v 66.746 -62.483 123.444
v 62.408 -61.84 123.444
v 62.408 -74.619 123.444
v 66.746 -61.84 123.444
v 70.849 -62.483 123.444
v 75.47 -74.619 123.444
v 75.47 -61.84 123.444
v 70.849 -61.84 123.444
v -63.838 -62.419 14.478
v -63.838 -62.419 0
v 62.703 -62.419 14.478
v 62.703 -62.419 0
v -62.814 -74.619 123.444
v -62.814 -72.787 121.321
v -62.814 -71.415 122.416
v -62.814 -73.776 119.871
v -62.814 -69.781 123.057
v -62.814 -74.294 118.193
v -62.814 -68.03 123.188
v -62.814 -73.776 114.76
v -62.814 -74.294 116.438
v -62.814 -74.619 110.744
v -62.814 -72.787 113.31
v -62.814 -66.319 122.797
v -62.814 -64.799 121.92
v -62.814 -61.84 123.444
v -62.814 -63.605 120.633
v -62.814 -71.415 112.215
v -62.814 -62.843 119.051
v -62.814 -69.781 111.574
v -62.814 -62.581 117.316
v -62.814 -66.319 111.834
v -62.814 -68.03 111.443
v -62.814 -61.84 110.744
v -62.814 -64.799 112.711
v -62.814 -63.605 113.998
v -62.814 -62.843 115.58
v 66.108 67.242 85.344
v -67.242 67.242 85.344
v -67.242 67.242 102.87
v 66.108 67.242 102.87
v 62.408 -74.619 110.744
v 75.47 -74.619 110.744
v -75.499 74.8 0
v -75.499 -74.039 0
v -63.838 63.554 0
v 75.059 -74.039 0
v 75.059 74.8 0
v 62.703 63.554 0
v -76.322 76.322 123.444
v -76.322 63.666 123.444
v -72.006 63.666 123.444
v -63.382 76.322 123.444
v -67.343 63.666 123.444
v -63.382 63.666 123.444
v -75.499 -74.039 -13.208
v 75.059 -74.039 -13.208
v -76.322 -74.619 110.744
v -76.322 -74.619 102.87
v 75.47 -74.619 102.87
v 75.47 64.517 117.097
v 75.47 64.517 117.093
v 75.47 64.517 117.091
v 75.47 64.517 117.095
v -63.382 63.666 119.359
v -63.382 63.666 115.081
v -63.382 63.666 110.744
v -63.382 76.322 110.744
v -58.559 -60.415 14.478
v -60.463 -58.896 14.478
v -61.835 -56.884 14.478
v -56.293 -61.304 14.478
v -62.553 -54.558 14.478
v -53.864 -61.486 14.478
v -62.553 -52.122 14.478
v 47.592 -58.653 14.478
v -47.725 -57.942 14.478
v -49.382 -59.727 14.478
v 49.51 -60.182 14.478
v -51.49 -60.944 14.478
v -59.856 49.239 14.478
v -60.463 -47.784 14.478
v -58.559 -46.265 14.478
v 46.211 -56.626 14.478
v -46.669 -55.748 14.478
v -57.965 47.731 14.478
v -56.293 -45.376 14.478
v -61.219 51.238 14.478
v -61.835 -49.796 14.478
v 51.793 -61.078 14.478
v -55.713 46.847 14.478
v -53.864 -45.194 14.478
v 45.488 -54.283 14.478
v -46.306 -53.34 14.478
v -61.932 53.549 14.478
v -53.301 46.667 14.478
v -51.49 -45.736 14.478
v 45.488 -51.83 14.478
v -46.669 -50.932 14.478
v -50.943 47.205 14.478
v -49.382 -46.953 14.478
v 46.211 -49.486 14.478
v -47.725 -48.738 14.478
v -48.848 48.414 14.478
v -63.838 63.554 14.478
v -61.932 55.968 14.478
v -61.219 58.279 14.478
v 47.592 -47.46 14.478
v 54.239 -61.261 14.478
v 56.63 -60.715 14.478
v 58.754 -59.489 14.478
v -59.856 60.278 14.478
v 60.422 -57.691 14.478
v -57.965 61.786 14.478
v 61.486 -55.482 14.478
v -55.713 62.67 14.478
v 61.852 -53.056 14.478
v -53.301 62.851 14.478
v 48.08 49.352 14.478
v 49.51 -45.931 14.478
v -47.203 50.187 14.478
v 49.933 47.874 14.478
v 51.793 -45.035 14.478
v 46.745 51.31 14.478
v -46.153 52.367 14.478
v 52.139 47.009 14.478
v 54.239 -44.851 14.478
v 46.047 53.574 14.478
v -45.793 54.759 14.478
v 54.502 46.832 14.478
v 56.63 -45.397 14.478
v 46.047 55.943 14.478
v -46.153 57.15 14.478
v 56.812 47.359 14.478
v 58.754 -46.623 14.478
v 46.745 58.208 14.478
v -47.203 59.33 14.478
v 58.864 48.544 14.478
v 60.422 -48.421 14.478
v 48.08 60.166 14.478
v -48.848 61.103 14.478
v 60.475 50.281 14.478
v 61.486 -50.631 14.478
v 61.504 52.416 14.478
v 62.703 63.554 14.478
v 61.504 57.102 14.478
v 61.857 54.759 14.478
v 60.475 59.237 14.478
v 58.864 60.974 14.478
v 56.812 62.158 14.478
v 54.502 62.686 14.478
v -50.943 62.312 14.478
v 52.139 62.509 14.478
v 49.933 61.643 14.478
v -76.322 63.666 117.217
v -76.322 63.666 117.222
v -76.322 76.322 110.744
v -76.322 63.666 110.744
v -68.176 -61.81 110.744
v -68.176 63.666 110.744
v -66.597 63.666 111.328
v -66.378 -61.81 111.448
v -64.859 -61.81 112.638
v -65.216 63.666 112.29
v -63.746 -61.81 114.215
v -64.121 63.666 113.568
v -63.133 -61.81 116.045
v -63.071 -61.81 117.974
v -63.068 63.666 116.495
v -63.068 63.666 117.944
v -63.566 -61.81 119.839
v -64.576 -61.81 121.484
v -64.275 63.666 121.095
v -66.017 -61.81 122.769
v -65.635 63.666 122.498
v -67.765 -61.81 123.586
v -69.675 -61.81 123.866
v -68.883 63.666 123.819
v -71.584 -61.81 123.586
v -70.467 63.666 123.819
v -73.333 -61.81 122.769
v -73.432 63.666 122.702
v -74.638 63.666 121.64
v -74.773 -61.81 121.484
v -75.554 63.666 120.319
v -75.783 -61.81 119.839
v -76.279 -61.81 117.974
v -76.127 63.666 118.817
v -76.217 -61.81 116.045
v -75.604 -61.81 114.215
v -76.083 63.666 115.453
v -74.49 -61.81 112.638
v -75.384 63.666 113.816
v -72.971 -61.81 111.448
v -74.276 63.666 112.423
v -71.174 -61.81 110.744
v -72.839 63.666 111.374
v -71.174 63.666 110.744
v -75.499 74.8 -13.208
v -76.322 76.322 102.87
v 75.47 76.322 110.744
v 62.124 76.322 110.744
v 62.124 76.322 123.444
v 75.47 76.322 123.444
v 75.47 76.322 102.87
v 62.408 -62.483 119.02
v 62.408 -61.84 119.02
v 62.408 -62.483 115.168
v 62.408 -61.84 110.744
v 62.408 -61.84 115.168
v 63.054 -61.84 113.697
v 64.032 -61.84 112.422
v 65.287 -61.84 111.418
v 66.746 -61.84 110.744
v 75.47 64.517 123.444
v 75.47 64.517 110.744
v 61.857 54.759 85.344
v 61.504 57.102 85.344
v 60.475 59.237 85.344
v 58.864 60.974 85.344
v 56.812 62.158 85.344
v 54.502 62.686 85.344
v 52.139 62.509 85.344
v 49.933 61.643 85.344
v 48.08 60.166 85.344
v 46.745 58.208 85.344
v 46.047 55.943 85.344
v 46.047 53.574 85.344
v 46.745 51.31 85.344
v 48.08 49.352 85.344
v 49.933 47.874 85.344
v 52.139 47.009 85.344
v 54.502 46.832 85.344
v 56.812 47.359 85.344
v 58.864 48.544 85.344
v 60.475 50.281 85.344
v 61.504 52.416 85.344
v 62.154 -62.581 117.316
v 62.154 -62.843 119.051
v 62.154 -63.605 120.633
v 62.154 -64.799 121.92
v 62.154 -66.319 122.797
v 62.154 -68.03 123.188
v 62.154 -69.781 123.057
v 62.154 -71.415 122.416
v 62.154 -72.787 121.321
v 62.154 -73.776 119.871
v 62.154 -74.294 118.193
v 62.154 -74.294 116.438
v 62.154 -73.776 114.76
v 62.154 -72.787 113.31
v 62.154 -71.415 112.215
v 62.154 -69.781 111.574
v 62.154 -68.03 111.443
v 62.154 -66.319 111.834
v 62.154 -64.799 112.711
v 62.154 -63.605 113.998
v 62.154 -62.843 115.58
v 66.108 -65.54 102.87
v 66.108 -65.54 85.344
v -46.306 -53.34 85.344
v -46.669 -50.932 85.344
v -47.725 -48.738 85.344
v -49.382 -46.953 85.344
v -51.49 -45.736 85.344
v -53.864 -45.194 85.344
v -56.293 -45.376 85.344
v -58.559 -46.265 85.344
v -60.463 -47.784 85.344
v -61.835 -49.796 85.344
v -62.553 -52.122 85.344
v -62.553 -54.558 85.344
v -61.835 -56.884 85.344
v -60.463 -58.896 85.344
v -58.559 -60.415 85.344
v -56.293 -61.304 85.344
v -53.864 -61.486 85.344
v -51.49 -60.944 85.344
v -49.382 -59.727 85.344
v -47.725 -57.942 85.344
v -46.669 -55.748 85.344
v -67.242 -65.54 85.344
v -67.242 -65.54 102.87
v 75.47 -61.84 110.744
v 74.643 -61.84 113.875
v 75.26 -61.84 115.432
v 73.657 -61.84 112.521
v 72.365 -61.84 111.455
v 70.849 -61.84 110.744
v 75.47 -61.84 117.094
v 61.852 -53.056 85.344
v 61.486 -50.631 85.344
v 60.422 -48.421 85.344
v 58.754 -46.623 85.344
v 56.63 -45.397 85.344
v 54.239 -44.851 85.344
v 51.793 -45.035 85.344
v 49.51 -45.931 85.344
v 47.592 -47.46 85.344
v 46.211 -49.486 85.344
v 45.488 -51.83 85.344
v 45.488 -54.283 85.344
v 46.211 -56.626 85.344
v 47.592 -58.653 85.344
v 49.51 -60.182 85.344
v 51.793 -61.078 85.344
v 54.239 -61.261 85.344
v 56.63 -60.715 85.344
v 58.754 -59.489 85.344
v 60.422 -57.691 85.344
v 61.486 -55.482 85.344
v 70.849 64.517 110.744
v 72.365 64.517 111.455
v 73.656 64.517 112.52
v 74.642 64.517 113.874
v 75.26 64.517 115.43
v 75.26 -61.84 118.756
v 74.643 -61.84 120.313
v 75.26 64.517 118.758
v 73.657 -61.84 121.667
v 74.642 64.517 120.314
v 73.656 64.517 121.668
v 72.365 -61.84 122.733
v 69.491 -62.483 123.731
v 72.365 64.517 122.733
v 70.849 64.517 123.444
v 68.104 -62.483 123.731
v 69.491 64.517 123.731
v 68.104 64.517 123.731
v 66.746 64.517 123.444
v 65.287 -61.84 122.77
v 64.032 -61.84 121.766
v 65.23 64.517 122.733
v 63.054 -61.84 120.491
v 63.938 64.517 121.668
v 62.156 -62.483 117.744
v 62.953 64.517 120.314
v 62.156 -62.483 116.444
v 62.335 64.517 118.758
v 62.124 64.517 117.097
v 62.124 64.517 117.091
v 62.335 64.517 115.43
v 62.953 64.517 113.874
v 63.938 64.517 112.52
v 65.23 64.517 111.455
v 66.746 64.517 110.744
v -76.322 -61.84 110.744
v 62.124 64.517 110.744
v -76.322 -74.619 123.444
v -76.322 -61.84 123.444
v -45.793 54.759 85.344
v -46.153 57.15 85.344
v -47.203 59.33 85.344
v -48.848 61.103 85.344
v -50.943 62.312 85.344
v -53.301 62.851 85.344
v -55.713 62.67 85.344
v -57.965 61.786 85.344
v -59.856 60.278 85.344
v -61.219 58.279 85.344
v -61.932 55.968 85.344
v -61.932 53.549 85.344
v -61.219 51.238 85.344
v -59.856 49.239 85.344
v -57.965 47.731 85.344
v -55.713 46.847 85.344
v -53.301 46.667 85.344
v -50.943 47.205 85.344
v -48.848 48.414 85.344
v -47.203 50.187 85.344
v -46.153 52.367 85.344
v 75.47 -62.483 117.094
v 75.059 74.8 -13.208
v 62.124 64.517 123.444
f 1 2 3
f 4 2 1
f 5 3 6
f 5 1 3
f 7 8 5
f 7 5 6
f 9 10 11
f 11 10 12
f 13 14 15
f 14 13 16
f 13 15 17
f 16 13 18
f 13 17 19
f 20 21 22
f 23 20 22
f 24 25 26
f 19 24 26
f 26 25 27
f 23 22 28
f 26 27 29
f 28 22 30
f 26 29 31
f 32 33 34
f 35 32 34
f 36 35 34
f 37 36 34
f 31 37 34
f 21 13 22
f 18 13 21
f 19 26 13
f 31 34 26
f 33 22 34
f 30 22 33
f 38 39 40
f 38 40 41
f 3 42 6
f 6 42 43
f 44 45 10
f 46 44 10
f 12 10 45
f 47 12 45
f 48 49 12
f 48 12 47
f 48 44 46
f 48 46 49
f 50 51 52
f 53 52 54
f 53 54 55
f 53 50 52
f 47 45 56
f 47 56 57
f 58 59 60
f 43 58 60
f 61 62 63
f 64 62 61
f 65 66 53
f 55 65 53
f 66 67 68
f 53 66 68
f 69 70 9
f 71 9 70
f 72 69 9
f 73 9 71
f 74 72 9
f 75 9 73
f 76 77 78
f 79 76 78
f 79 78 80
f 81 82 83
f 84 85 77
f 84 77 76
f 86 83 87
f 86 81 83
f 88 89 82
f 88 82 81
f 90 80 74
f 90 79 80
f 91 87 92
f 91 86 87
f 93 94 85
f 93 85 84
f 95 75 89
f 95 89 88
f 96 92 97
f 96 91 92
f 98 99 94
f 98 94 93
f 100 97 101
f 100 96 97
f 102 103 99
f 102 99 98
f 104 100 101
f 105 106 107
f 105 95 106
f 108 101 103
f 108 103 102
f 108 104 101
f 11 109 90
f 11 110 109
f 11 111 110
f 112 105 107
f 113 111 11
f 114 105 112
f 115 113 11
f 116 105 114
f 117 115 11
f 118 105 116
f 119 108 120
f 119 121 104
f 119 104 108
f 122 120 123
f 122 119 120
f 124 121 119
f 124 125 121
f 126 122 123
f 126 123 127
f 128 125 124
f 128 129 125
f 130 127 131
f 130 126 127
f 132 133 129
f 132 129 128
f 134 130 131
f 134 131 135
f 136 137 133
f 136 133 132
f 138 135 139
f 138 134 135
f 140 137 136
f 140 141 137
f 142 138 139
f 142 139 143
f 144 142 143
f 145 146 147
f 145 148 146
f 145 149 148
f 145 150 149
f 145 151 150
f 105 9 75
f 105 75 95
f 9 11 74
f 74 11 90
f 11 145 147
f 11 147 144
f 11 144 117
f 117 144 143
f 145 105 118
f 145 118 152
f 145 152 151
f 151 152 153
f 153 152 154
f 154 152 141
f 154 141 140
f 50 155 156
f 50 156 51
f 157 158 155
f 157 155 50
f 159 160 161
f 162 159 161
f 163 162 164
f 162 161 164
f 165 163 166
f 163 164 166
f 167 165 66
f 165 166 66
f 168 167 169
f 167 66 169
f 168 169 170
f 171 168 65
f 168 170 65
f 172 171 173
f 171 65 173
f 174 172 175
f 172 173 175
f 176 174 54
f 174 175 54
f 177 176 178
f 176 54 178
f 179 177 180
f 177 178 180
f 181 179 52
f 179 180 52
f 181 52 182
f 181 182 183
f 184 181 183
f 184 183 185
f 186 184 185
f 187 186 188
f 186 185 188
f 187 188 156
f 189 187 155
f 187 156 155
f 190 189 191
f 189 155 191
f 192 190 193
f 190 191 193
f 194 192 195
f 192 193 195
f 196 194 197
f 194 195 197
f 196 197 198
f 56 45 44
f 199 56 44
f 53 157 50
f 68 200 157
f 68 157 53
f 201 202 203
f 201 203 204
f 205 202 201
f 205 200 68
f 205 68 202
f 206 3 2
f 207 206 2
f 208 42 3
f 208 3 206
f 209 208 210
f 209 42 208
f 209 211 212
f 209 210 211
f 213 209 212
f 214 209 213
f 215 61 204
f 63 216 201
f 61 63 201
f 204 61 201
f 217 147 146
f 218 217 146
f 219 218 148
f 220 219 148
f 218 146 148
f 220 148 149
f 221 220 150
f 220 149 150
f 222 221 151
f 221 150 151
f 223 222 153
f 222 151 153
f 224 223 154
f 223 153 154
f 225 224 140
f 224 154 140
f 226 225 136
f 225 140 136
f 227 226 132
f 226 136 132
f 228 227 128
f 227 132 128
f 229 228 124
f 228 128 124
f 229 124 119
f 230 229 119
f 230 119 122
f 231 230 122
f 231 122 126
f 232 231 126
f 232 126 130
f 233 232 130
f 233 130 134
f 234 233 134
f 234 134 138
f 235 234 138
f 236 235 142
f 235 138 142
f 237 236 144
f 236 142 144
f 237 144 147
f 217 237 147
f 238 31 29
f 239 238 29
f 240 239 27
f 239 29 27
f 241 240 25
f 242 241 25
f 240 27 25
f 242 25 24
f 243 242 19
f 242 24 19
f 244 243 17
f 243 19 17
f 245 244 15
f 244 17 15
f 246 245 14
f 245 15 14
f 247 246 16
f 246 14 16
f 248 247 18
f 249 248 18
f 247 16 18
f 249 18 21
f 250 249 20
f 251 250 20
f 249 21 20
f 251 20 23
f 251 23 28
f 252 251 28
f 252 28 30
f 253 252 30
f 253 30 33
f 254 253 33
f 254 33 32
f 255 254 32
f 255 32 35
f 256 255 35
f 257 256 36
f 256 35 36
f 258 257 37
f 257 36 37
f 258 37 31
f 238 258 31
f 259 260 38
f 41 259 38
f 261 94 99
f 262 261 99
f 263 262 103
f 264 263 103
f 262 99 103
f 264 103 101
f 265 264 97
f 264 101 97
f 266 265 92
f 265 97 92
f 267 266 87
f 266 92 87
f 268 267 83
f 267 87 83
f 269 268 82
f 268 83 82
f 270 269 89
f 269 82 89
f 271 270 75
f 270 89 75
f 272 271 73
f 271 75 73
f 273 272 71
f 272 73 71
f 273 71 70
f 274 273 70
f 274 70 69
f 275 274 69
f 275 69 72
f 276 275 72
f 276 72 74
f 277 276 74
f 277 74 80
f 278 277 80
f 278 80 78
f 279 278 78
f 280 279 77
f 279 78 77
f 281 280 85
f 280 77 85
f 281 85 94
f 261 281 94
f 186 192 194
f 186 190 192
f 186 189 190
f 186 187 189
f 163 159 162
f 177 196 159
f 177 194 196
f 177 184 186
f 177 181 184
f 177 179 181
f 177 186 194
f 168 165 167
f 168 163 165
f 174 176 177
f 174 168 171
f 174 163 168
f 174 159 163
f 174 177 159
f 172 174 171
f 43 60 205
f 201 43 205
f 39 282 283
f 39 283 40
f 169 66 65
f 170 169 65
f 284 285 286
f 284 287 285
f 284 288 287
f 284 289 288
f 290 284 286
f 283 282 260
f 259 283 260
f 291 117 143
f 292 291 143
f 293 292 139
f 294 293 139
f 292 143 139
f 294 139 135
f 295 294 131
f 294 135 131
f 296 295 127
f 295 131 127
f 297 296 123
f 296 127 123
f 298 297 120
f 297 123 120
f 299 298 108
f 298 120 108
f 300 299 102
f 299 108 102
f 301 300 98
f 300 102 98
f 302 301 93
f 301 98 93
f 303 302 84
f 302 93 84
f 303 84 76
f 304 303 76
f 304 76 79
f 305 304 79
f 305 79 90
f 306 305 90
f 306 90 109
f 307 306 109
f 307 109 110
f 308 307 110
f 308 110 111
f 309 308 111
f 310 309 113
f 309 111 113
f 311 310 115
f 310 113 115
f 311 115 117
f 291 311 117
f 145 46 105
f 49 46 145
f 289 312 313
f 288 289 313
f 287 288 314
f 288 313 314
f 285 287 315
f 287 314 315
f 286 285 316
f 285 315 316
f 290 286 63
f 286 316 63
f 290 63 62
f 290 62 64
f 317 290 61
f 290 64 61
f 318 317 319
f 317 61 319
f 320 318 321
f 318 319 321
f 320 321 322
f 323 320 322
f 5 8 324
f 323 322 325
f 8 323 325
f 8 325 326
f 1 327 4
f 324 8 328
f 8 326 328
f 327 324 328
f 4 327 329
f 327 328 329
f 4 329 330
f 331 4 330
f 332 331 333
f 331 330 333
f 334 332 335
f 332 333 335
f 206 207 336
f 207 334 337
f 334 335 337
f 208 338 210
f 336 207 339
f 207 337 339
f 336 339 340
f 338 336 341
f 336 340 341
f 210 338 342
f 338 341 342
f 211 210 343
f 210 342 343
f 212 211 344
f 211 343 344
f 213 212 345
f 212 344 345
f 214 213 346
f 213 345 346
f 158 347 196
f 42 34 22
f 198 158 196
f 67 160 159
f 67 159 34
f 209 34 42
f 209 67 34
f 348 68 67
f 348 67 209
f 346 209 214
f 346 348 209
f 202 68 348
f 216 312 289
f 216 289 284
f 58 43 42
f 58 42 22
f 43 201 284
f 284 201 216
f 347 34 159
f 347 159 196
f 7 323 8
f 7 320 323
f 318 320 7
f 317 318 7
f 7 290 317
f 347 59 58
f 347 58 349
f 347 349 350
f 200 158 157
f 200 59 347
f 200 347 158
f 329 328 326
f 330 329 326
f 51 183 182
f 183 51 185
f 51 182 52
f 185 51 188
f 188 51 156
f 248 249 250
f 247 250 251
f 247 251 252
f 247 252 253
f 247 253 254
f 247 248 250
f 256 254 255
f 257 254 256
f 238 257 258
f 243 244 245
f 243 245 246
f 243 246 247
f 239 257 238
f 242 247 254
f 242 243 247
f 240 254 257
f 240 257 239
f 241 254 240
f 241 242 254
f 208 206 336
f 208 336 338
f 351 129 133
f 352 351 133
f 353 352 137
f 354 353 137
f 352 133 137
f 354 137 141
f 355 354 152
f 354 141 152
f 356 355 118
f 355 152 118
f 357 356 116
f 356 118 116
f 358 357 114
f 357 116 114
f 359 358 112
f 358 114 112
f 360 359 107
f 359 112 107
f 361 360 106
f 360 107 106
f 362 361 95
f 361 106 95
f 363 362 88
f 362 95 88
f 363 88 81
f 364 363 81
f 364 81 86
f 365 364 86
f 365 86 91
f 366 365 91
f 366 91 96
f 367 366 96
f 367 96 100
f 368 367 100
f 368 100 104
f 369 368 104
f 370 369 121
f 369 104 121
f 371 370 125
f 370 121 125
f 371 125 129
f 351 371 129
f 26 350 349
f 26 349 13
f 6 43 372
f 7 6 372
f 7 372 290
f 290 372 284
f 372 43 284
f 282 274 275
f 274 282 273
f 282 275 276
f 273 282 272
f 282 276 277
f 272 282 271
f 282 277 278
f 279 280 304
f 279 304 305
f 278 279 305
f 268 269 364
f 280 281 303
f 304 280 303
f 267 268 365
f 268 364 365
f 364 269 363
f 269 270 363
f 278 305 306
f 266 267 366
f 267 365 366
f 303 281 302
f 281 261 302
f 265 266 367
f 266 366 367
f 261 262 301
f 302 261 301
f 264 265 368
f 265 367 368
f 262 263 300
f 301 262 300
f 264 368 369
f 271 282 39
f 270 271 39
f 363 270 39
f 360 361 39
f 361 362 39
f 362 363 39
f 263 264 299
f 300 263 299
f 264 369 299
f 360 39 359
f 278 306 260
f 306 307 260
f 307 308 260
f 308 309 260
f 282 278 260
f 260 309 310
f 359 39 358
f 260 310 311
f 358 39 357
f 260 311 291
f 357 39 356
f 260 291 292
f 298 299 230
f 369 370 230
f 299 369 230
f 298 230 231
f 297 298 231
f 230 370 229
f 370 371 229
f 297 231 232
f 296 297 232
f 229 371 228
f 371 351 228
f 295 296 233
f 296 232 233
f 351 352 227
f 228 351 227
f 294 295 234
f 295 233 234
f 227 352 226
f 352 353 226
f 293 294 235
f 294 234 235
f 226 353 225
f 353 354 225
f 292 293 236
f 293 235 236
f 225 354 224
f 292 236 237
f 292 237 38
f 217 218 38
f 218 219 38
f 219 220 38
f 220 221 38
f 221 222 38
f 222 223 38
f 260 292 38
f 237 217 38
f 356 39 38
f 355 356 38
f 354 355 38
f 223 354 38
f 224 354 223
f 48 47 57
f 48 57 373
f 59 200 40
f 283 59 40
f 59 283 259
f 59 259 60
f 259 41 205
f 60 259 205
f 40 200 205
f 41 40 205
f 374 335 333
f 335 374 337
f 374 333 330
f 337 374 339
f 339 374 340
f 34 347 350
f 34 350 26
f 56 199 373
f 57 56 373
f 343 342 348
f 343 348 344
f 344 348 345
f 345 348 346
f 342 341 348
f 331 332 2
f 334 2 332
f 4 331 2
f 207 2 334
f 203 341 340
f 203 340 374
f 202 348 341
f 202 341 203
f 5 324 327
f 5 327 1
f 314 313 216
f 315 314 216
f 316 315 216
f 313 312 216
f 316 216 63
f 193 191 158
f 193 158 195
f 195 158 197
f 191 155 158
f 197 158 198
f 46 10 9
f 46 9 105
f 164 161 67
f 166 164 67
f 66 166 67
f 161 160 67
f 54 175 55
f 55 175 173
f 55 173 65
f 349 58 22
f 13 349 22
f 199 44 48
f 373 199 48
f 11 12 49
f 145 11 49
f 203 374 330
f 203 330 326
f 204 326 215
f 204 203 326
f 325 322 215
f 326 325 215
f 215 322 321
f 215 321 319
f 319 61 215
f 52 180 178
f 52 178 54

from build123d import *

# Parameters (mm, degrees)
F0_W      = 150.558009
F0_H      = 148.838363
F1_DEPTH  = 13.208
F2_W      = 126.540639
F2_H      = 125.973191
F3_DEPTH  = 14.478
F4_R      = 8.114688
F4_R_2    = 8.169072
F4_R_3    = 8.227981
F4_R_4    = 7.949321
F5_DEPTH  = 70.866
F6_W      = 133.349993
F6_H      = 132.782564
F7_DEPTH  = 17.526
F8_W      = 151.792019
F8_H      = 150.94085
F9_DEPTH  = 7.874
F10_W     = 12.939997
F10_H     = 12.656048
F10_W_2   = 13.507895
F10_H_2   = 12.779001
F10_W_3   = 13.062272
F10_W_4   = 13.346217
F10_H_3   = 11.8042
F11_DEPTH = 12.7
F12_R     = 6.673109
F13_DEPTH = 127
F14_R     = 6.64679
F15_DEPTH = 125.476
F16_R     = 5.888986
F17_DEPTH = 124.968


with BuildPart() as f1:
    # F0 (on Top) → F1 (new body)
    with BuildSketch(Plane.XY):
        with Locations((-0.219747, 0.380617)):
            Rectangle(F0_W, F0_H)
    extrude(amount=-F1_DEPTH)

    # F2 (on face) → F3 (join)
    with BuildSketch(Plane.XY):
        with Locations((-0.567448, 0.567446)):
            Rectangle(F2_W, F2_H)
    extrude(amount=F3_DEPTH)

    # F4 (on face) → F5 (join)
    with BuildSketch(Plane.XY.offset(14.478)):
        with Locations((-53.907447, 54.758616)):
            Circle(F4_R)
        with Locations((-54.474894, -53.340003)):
            Circle(F4_R_2)
        with Locations((53.623725, -53.056277)):
            Circle(F4_R_3)
        with Locations((53.907447, 54.758616)):
            Circle(F4_R_4)
    extrude(amount=F5_DEPTH)

    # F6 (on face) → F7 (join)
    with BuildSketch(Plane.XY.offset(85.344)):
        with Locations((-0.567448, 0.851169)):
            Rectangle(F6_W, F6_H)
    extrude(amount=F7_DEPTH)

    # F8 (on face) → F9 (join)
    with BuildSketch(Plane.XY.offset(102.87)):
        with Locations((-0.425584, 0.851169)):
            Rectangle(F8_W, F8_H)
    extrude(amount=F9_DEPTH)

    # F10 (on face) → F11 (join)
    with BuildSketch(Plane.XY.offset(110.744)):
        with Locations((-69.851596, 69.99357)):
            Rectangle(F10_W, F10_H)
        with Locations((-69.567646, -68.229755)):
            Rectangle(F10_W_2, F10_H_2)
        with Locations((68.939289, -68.229755)):
            Rectangle(F10_W_3, F10_H_2)
        with Locations((68.797316, 70.419494)):
            Rectangle(F10_W_4, F10_H_3)
    extrude(amount=F11_DEPTH)

    # F12 (on face) → F13 (join)
    with BuildSketch(Plane.XZ.offset(-64.517394)):
        with Locations((68.797316, 117.094)):
            Circle(F12_R)
    extrude(amount=F13_DEPTH)

    # F14 (on face) → F15 (join)
    with BuildSketch(Plane.XZ.offset(-63.665546)):
        with Locations((-69.674805, 117.219515)):
            Circle(F14_R)
    extrude(amount=F15_DEPTH)

    # F16 (on face) → F17 (join)
    with BuildSketch(Plane.YZ.offset(-62.813699)):
        with Locations((-68.470404, 117.315501)):
            Circle(F16_R)
    extrude(amount=F17_DEPTH)


solid = f1.part
